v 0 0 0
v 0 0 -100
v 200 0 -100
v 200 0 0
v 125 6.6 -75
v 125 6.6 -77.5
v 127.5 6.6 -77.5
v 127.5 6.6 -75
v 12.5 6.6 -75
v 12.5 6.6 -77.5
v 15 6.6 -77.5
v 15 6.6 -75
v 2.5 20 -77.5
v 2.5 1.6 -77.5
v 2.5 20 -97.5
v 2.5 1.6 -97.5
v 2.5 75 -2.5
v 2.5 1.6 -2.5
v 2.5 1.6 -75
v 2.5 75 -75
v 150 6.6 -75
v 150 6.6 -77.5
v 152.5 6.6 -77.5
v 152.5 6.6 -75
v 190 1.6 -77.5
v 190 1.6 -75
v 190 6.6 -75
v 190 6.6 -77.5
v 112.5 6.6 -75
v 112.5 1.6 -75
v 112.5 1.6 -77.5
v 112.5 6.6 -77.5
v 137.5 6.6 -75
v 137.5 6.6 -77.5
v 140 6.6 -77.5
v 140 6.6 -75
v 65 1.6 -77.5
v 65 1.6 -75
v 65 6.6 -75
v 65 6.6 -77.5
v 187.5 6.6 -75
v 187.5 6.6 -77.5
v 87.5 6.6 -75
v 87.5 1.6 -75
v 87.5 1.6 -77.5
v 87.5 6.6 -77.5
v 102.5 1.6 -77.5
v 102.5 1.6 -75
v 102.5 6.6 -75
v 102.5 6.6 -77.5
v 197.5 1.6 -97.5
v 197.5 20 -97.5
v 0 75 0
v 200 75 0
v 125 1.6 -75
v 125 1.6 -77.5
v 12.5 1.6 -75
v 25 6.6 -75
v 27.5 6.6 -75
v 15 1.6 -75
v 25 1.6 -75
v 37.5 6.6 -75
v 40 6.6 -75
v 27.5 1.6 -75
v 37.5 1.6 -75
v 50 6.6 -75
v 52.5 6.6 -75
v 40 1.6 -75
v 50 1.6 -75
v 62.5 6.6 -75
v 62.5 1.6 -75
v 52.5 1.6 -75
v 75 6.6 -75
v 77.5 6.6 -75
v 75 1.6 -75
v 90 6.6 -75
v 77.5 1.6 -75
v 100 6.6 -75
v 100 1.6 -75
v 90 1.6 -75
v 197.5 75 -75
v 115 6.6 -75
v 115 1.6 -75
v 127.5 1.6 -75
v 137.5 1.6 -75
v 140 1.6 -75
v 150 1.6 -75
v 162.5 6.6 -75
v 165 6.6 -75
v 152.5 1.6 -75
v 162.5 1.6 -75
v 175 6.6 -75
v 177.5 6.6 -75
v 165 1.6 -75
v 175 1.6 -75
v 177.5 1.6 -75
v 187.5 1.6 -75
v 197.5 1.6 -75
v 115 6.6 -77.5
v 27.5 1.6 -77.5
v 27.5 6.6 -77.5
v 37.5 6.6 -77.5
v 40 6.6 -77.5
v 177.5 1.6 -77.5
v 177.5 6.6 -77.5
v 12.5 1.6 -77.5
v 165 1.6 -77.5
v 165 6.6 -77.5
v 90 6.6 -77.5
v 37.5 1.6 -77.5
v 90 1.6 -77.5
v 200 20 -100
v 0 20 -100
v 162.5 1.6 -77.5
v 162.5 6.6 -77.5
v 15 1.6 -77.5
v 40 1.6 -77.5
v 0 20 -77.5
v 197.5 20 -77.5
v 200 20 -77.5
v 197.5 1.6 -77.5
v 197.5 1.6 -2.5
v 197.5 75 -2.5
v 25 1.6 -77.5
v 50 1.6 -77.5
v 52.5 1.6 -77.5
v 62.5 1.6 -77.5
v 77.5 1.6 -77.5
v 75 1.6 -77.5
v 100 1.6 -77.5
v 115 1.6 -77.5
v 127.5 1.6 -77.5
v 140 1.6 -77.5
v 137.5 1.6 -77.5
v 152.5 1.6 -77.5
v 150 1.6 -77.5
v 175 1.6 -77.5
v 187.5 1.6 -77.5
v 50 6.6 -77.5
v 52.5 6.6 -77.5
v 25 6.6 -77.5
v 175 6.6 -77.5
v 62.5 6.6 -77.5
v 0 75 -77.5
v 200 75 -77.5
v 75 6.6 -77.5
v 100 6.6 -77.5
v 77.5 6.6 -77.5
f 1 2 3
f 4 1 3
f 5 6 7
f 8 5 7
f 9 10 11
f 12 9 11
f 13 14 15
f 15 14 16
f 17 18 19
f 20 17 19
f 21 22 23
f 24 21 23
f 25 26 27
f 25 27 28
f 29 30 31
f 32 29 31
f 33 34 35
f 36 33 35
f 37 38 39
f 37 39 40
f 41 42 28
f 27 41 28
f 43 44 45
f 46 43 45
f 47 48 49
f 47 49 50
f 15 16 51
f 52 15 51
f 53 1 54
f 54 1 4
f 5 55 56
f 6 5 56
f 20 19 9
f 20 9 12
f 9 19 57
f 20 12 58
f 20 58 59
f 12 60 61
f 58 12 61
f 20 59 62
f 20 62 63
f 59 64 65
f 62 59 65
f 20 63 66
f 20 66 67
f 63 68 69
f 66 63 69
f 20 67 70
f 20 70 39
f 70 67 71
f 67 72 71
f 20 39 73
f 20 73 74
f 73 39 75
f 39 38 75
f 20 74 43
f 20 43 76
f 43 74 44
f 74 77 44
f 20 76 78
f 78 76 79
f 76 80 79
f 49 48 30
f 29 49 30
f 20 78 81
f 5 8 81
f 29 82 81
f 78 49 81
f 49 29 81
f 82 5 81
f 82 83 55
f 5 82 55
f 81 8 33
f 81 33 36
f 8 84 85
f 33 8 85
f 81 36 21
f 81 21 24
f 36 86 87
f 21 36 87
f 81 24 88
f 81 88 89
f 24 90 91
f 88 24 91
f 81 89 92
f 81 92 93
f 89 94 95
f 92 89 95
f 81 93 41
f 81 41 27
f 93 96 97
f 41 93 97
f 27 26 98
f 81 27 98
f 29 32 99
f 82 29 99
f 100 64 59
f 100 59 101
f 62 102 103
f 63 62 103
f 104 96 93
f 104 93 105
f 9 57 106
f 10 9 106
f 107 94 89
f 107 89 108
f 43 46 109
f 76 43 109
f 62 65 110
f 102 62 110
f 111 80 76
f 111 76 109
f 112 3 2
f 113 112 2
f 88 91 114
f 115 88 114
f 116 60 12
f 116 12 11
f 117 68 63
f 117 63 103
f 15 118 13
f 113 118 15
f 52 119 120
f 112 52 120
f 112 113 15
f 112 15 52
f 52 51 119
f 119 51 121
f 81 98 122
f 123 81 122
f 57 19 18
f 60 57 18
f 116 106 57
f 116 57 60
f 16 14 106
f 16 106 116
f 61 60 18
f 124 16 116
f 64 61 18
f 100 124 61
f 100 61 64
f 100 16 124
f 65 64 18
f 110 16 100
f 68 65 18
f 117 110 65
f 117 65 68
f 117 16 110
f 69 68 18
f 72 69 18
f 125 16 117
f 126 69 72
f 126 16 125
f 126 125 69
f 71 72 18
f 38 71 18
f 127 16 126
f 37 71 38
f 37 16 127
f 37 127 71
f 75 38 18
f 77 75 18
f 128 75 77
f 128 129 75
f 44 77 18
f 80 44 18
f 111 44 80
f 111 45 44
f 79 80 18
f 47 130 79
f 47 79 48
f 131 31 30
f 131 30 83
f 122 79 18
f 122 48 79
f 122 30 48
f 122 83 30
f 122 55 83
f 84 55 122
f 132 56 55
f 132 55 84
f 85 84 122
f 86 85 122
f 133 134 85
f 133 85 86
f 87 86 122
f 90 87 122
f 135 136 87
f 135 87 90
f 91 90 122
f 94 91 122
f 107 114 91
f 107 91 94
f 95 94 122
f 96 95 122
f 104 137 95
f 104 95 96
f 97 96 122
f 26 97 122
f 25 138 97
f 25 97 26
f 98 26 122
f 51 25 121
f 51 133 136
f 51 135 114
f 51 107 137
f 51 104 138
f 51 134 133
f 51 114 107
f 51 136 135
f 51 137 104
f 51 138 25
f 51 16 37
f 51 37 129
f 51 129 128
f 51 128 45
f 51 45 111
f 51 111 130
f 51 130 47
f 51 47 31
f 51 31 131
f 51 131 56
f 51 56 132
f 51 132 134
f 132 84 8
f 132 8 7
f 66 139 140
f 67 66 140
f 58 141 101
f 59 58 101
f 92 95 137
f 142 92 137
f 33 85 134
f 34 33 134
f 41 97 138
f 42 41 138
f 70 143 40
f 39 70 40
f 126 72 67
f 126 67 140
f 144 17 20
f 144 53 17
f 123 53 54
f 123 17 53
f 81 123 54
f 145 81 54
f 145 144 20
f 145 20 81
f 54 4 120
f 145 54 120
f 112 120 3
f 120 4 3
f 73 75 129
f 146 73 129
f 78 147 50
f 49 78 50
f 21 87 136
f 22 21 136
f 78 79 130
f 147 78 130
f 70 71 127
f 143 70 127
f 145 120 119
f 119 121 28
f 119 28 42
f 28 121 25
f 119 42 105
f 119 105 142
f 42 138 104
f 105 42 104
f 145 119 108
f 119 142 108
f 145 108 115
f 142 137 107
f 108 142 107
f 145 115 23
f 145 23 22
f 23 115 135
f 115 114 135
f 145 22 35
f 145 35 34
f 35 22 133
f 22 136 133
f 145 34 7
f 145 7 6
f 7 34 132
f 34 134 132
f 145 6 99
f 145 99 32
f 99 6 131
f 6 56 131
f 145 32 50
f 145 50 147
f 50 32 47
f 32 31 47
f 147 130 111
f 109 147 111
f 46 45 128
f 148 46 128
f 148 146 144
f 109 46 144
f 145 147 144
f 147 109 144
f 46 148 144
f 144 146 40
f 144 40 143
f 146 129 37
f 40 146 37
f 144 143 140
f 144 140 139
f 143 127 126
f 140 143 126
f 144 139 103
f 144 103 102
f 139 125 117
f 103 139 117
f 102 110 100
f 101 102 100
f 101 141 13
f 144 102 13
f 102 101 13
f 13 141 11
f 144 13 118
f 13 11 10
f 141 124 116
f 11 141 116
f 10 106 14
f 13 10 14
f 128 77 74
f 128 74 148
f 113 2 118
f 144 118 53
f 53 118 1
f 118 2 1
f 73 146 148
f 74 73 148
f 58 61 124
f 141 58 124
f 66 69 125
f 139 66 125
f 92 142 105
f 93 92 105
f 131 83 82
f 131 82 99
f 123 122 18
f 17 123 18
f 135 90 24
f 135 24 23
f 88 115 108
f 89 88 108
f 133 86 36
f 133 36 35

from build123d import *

# Parameters (mm, degrees)
SKETCH1_W           = 195
SKETCH1_H           = 95
BOSS_EXTRUDE1_DEPTH = 1.6
SKETCH1_5_W         = 7.5
SKETCH1_5_H         = 2.5
SKETCH1_5_W_2       = 2.5
SKETCH1_5_W_3       = 10
BOSS_EXTRUDE2_DEPTH = 75
BOSS_EXTRUDE3_DEPTH = 20
CUT_EXTRUDE1_START  = 1.6
SKETCH1_7_W         = 2.5
SKETCH1_7_H         = 2.5
CUT_EXTRUDE1_DEPTH  = 5


with BuildPart() as part:
    # Sketch1 → Boss-Extrude1 (new body)
    with BuildSketch(Plane(origin=(0, 0, 0), x_dir=(1, 0, 0), z_dir=(0, 1, 0))):
        with Locations((100, 50)):
            Rectangle(SKETCH1_W, SKETCH1_H)
    extrude(amount=BOSS_EXTRUDE1_DEPTH)

    # Sketch1<5> → Boss-Extrude2 (add)
    with BuildSketch(Plane(origin=(0, 0, 0), x_dir=(1, 0, 0), z_dir=(0, 1, 0))):
        Polygon((0, 0), (100, 0), (100, 2.5), (2.5, 2.5), (2.5, 75), (2.5, 77.5), (0, 77.5), align=None)
        Polygon((100, 2.5), (100, 0), (200, 0), (200, 77.5), (197.5, 77.5), (197.5, 75), (197.5, 2.5), align=None)
        with Locations((193.75, 76.25)):
            Rectangle(SKETCH1_5_W, SKETCH1_5_H)
        with Locations((188.75, 76.25)):
            Rectangle(SKETCH1_5_W_2, SKETCH1_5_H)
        with Locations((182.5, 76.25)):
            Rectangle(SKETCH1_5_W_3, SKETCH1_5_H)
        with Locations((176.25, 76.25)):
            Rectangle(SKETCH1_5_W_2, SKETCH1_5_H)
        with Locations((170, 76.25)):
            Rectangle(SKETCH1_5_W_3, SKETCH1_5_H)
        with Locations((163.75, 76.25)):
            Rectangle(SKETCH1_5_W_2, SKETCH1_5_H)
        with Locations((157.5, 76.25)):
            Rectangle(SKETCH1_5_W_3, SKETCH1_5_H)
        with Locations((151.25, 76.25)):
            Rectangle(SKETCH1_5_W_2, SKETCH1_5_H)
        with Locations((145, 76.25)):
            Rectangle(SKETCH1_5_W_3, SKETCH1_5_H)
        with Locations((138.75, 76.25)):
            Rectangle(SKETCH1_5_W_2, SKETCH1_5_H)
        with Locations((132.5, 76.25)):
            Rectangle(SKETCH1_5_W_3, SKETCH1_5_H)
        with Locations((126.25, 76.25)):
            Rectangle(SKETCH1_5_W_2, SKETCH1_5_H)
        with Locations((120, 76.25)):
            Rectangle(SKETCH1_5_W_3, SKETCH1_5_H)
        with Locations((113.75, 76.25)):
            Rectangle(SKETCH1_5_W_2, SKETCH1_5_H)
        with Locations((107.5, 76.25)):
            Rectangle(SKETCH1_5_W_3, SKETCH1_5_H)
        with Locations((101.25, 76.25)):
            Rectangle(SKETCH1_5_W_2, SKETCH1_5_H)
        with Locations((95, 76.25)):
            Rectangle(SKETCH1_5_W_3, SKETCH1_5_H)
        with Locations((88.75, 76.25)):
            Rectangle(SKETCH1_5_W_2, SKETCH1_5_H)
        with Locations((82.5, 76.25)):
            Rectangle(SKETCH1_5_W_3, SKETCH1_5_H)
        with Locations((76.25, 76.25)):
            Rectangle(SKETCH1_5_W_2, SKETCH1_5_H)
        with Locations((70, 76.25)):
            Rectangle(SKETCH1_5_W_3, SKETCH1_5_H)
        with Locations((63.75, 76.25)):
            Rectangle(SKETCH1_5_W_2, SKETCH1_5_H)
        with Locations((57.5, 76.25)):
            Rectangle(SKETCH1_5_W_3, SKETCH1_5_H)
        with Locations((51.25, 76.25)):
            Rectangle(SKETCH1_5_W_2, SKETCH1_5_H)
        with Locations((45, 76.25)):
            Rectangle(SKETCH1_5_W_3, SKETCH1_5_H)
        with Locations((38.75, 76.25)):
            Rectangle(SKETCH1_5_W_2, SKETCH1_5_H)
        with Locations((32.5, 76.25)):
            Rectangle(SKETCH1_5_W_3, SKETCH1_5_H)
        with Locations((26.25, 76.25)):
            Rectangle(SKETCH1_5_W_2, SKETCH1_5_H)
        with Locations((20, 76.25)):
            Rectangle(SKETCH1_5_W_3, SKETCH1_5_H)
        with Locations((13.75, 76.25)):
            Rectangle(SKETCH1_5_W_2, SKETCH1_5_H)
        with Locations((7.5, 76.25)):
            Rectangle(SKETCH1_5_W_3, SKETCH1_5_H)
    extrude(amount=BOSS_EXTRUDE2_DEPTH)

    # Sketch1<6> → Boss-Extrude3 (add)
    with BuildSketch(Plane(origin=(0, 0, 0), x_dir=(1, 0, 0), z_dir=(0, 1, 0))):
        Polygon((0, 100), (0, 77.5), (2.5, 77.5), (2.5, 97.5), (197.5, 97.5), (197.5, 77.5), (200, 77.5), (200, 100), align=None)
    extrude(amount=BOSS_EXTRUDE3_DEPTH)

    # Sketch1<7> → Cut-Extrude1 (cut)
    with BuildSketch(Plane(origin=(0, 0, 0), x_dir=(1, 0, 0), z_dir=(0, 1, 0)).offset(CUT_EXTRUDE1_START)):
        with Locations((188.75, 76.25)):
            Rectangle(SKETCH1_7_W, SKETCH1_7_H)
        with Locations((176.25, 76.25)):
            Rectangle(SKETCH1_7_W, SKETCH1_7_H)
        with Locations((163.75, 76.25)):
            Rectangle(SKETCH1_7_W, SKETCH1_7_H)
        with Locations((151.25, 76.25)):
            Rectangle(SKETCH1_7_W, SKETCH1_7_H)
        with Locations((138.75, 76.25)):
            Rectangle(SKETCH1_7_W, SKETCH1_7_H)
        with Locations((126.25, 76.25)):
            Rectangle(SKETCH1_7_W, SKETCH1_7_H)
        with Locations((113.75, 76.25)):
            Rectangle(SKETCH1_7_W, SKETCH1_7_H)
        with Locations((101.25, 76.25)):
            Rectangle(SKETCH1_7_W, SKETCH1_7_H)
        with Locations((88.75, 76.25)):
            Rectangle(SKETCH1_7_W, SKETCH1_7_H)
        with Locations((76.25, 76.25)):
            Rectangle(SKETCH1_7_W, SKETCH1_7_H)
        with Locations((63.75, 76.25)):
            Rectangle(SKETCH1_7_W, SKETCH1_7_H)
        with Locations((51.25, 76.25)):
            Rectangle(SKETCH1_7_W, SKETCH1_7_H)
        with Locations((38.75, 76.25)):
            Rectangle(SKETCH1_7_W, SKETCH1_7_H)
        with Locations((26.25, 76.25)):
            Rectangle(SKETCH1_7_W, SKETCH1_7_H)
        with Locations((13.75, 76.25)):
            Rectangle(SKETCH1_7_W, SKETCH1_7_H)
    extrude(amount=CUT_EXTRUDE1_DEPTH, mode=Mode.SUBTRACT)


solid = part.part
